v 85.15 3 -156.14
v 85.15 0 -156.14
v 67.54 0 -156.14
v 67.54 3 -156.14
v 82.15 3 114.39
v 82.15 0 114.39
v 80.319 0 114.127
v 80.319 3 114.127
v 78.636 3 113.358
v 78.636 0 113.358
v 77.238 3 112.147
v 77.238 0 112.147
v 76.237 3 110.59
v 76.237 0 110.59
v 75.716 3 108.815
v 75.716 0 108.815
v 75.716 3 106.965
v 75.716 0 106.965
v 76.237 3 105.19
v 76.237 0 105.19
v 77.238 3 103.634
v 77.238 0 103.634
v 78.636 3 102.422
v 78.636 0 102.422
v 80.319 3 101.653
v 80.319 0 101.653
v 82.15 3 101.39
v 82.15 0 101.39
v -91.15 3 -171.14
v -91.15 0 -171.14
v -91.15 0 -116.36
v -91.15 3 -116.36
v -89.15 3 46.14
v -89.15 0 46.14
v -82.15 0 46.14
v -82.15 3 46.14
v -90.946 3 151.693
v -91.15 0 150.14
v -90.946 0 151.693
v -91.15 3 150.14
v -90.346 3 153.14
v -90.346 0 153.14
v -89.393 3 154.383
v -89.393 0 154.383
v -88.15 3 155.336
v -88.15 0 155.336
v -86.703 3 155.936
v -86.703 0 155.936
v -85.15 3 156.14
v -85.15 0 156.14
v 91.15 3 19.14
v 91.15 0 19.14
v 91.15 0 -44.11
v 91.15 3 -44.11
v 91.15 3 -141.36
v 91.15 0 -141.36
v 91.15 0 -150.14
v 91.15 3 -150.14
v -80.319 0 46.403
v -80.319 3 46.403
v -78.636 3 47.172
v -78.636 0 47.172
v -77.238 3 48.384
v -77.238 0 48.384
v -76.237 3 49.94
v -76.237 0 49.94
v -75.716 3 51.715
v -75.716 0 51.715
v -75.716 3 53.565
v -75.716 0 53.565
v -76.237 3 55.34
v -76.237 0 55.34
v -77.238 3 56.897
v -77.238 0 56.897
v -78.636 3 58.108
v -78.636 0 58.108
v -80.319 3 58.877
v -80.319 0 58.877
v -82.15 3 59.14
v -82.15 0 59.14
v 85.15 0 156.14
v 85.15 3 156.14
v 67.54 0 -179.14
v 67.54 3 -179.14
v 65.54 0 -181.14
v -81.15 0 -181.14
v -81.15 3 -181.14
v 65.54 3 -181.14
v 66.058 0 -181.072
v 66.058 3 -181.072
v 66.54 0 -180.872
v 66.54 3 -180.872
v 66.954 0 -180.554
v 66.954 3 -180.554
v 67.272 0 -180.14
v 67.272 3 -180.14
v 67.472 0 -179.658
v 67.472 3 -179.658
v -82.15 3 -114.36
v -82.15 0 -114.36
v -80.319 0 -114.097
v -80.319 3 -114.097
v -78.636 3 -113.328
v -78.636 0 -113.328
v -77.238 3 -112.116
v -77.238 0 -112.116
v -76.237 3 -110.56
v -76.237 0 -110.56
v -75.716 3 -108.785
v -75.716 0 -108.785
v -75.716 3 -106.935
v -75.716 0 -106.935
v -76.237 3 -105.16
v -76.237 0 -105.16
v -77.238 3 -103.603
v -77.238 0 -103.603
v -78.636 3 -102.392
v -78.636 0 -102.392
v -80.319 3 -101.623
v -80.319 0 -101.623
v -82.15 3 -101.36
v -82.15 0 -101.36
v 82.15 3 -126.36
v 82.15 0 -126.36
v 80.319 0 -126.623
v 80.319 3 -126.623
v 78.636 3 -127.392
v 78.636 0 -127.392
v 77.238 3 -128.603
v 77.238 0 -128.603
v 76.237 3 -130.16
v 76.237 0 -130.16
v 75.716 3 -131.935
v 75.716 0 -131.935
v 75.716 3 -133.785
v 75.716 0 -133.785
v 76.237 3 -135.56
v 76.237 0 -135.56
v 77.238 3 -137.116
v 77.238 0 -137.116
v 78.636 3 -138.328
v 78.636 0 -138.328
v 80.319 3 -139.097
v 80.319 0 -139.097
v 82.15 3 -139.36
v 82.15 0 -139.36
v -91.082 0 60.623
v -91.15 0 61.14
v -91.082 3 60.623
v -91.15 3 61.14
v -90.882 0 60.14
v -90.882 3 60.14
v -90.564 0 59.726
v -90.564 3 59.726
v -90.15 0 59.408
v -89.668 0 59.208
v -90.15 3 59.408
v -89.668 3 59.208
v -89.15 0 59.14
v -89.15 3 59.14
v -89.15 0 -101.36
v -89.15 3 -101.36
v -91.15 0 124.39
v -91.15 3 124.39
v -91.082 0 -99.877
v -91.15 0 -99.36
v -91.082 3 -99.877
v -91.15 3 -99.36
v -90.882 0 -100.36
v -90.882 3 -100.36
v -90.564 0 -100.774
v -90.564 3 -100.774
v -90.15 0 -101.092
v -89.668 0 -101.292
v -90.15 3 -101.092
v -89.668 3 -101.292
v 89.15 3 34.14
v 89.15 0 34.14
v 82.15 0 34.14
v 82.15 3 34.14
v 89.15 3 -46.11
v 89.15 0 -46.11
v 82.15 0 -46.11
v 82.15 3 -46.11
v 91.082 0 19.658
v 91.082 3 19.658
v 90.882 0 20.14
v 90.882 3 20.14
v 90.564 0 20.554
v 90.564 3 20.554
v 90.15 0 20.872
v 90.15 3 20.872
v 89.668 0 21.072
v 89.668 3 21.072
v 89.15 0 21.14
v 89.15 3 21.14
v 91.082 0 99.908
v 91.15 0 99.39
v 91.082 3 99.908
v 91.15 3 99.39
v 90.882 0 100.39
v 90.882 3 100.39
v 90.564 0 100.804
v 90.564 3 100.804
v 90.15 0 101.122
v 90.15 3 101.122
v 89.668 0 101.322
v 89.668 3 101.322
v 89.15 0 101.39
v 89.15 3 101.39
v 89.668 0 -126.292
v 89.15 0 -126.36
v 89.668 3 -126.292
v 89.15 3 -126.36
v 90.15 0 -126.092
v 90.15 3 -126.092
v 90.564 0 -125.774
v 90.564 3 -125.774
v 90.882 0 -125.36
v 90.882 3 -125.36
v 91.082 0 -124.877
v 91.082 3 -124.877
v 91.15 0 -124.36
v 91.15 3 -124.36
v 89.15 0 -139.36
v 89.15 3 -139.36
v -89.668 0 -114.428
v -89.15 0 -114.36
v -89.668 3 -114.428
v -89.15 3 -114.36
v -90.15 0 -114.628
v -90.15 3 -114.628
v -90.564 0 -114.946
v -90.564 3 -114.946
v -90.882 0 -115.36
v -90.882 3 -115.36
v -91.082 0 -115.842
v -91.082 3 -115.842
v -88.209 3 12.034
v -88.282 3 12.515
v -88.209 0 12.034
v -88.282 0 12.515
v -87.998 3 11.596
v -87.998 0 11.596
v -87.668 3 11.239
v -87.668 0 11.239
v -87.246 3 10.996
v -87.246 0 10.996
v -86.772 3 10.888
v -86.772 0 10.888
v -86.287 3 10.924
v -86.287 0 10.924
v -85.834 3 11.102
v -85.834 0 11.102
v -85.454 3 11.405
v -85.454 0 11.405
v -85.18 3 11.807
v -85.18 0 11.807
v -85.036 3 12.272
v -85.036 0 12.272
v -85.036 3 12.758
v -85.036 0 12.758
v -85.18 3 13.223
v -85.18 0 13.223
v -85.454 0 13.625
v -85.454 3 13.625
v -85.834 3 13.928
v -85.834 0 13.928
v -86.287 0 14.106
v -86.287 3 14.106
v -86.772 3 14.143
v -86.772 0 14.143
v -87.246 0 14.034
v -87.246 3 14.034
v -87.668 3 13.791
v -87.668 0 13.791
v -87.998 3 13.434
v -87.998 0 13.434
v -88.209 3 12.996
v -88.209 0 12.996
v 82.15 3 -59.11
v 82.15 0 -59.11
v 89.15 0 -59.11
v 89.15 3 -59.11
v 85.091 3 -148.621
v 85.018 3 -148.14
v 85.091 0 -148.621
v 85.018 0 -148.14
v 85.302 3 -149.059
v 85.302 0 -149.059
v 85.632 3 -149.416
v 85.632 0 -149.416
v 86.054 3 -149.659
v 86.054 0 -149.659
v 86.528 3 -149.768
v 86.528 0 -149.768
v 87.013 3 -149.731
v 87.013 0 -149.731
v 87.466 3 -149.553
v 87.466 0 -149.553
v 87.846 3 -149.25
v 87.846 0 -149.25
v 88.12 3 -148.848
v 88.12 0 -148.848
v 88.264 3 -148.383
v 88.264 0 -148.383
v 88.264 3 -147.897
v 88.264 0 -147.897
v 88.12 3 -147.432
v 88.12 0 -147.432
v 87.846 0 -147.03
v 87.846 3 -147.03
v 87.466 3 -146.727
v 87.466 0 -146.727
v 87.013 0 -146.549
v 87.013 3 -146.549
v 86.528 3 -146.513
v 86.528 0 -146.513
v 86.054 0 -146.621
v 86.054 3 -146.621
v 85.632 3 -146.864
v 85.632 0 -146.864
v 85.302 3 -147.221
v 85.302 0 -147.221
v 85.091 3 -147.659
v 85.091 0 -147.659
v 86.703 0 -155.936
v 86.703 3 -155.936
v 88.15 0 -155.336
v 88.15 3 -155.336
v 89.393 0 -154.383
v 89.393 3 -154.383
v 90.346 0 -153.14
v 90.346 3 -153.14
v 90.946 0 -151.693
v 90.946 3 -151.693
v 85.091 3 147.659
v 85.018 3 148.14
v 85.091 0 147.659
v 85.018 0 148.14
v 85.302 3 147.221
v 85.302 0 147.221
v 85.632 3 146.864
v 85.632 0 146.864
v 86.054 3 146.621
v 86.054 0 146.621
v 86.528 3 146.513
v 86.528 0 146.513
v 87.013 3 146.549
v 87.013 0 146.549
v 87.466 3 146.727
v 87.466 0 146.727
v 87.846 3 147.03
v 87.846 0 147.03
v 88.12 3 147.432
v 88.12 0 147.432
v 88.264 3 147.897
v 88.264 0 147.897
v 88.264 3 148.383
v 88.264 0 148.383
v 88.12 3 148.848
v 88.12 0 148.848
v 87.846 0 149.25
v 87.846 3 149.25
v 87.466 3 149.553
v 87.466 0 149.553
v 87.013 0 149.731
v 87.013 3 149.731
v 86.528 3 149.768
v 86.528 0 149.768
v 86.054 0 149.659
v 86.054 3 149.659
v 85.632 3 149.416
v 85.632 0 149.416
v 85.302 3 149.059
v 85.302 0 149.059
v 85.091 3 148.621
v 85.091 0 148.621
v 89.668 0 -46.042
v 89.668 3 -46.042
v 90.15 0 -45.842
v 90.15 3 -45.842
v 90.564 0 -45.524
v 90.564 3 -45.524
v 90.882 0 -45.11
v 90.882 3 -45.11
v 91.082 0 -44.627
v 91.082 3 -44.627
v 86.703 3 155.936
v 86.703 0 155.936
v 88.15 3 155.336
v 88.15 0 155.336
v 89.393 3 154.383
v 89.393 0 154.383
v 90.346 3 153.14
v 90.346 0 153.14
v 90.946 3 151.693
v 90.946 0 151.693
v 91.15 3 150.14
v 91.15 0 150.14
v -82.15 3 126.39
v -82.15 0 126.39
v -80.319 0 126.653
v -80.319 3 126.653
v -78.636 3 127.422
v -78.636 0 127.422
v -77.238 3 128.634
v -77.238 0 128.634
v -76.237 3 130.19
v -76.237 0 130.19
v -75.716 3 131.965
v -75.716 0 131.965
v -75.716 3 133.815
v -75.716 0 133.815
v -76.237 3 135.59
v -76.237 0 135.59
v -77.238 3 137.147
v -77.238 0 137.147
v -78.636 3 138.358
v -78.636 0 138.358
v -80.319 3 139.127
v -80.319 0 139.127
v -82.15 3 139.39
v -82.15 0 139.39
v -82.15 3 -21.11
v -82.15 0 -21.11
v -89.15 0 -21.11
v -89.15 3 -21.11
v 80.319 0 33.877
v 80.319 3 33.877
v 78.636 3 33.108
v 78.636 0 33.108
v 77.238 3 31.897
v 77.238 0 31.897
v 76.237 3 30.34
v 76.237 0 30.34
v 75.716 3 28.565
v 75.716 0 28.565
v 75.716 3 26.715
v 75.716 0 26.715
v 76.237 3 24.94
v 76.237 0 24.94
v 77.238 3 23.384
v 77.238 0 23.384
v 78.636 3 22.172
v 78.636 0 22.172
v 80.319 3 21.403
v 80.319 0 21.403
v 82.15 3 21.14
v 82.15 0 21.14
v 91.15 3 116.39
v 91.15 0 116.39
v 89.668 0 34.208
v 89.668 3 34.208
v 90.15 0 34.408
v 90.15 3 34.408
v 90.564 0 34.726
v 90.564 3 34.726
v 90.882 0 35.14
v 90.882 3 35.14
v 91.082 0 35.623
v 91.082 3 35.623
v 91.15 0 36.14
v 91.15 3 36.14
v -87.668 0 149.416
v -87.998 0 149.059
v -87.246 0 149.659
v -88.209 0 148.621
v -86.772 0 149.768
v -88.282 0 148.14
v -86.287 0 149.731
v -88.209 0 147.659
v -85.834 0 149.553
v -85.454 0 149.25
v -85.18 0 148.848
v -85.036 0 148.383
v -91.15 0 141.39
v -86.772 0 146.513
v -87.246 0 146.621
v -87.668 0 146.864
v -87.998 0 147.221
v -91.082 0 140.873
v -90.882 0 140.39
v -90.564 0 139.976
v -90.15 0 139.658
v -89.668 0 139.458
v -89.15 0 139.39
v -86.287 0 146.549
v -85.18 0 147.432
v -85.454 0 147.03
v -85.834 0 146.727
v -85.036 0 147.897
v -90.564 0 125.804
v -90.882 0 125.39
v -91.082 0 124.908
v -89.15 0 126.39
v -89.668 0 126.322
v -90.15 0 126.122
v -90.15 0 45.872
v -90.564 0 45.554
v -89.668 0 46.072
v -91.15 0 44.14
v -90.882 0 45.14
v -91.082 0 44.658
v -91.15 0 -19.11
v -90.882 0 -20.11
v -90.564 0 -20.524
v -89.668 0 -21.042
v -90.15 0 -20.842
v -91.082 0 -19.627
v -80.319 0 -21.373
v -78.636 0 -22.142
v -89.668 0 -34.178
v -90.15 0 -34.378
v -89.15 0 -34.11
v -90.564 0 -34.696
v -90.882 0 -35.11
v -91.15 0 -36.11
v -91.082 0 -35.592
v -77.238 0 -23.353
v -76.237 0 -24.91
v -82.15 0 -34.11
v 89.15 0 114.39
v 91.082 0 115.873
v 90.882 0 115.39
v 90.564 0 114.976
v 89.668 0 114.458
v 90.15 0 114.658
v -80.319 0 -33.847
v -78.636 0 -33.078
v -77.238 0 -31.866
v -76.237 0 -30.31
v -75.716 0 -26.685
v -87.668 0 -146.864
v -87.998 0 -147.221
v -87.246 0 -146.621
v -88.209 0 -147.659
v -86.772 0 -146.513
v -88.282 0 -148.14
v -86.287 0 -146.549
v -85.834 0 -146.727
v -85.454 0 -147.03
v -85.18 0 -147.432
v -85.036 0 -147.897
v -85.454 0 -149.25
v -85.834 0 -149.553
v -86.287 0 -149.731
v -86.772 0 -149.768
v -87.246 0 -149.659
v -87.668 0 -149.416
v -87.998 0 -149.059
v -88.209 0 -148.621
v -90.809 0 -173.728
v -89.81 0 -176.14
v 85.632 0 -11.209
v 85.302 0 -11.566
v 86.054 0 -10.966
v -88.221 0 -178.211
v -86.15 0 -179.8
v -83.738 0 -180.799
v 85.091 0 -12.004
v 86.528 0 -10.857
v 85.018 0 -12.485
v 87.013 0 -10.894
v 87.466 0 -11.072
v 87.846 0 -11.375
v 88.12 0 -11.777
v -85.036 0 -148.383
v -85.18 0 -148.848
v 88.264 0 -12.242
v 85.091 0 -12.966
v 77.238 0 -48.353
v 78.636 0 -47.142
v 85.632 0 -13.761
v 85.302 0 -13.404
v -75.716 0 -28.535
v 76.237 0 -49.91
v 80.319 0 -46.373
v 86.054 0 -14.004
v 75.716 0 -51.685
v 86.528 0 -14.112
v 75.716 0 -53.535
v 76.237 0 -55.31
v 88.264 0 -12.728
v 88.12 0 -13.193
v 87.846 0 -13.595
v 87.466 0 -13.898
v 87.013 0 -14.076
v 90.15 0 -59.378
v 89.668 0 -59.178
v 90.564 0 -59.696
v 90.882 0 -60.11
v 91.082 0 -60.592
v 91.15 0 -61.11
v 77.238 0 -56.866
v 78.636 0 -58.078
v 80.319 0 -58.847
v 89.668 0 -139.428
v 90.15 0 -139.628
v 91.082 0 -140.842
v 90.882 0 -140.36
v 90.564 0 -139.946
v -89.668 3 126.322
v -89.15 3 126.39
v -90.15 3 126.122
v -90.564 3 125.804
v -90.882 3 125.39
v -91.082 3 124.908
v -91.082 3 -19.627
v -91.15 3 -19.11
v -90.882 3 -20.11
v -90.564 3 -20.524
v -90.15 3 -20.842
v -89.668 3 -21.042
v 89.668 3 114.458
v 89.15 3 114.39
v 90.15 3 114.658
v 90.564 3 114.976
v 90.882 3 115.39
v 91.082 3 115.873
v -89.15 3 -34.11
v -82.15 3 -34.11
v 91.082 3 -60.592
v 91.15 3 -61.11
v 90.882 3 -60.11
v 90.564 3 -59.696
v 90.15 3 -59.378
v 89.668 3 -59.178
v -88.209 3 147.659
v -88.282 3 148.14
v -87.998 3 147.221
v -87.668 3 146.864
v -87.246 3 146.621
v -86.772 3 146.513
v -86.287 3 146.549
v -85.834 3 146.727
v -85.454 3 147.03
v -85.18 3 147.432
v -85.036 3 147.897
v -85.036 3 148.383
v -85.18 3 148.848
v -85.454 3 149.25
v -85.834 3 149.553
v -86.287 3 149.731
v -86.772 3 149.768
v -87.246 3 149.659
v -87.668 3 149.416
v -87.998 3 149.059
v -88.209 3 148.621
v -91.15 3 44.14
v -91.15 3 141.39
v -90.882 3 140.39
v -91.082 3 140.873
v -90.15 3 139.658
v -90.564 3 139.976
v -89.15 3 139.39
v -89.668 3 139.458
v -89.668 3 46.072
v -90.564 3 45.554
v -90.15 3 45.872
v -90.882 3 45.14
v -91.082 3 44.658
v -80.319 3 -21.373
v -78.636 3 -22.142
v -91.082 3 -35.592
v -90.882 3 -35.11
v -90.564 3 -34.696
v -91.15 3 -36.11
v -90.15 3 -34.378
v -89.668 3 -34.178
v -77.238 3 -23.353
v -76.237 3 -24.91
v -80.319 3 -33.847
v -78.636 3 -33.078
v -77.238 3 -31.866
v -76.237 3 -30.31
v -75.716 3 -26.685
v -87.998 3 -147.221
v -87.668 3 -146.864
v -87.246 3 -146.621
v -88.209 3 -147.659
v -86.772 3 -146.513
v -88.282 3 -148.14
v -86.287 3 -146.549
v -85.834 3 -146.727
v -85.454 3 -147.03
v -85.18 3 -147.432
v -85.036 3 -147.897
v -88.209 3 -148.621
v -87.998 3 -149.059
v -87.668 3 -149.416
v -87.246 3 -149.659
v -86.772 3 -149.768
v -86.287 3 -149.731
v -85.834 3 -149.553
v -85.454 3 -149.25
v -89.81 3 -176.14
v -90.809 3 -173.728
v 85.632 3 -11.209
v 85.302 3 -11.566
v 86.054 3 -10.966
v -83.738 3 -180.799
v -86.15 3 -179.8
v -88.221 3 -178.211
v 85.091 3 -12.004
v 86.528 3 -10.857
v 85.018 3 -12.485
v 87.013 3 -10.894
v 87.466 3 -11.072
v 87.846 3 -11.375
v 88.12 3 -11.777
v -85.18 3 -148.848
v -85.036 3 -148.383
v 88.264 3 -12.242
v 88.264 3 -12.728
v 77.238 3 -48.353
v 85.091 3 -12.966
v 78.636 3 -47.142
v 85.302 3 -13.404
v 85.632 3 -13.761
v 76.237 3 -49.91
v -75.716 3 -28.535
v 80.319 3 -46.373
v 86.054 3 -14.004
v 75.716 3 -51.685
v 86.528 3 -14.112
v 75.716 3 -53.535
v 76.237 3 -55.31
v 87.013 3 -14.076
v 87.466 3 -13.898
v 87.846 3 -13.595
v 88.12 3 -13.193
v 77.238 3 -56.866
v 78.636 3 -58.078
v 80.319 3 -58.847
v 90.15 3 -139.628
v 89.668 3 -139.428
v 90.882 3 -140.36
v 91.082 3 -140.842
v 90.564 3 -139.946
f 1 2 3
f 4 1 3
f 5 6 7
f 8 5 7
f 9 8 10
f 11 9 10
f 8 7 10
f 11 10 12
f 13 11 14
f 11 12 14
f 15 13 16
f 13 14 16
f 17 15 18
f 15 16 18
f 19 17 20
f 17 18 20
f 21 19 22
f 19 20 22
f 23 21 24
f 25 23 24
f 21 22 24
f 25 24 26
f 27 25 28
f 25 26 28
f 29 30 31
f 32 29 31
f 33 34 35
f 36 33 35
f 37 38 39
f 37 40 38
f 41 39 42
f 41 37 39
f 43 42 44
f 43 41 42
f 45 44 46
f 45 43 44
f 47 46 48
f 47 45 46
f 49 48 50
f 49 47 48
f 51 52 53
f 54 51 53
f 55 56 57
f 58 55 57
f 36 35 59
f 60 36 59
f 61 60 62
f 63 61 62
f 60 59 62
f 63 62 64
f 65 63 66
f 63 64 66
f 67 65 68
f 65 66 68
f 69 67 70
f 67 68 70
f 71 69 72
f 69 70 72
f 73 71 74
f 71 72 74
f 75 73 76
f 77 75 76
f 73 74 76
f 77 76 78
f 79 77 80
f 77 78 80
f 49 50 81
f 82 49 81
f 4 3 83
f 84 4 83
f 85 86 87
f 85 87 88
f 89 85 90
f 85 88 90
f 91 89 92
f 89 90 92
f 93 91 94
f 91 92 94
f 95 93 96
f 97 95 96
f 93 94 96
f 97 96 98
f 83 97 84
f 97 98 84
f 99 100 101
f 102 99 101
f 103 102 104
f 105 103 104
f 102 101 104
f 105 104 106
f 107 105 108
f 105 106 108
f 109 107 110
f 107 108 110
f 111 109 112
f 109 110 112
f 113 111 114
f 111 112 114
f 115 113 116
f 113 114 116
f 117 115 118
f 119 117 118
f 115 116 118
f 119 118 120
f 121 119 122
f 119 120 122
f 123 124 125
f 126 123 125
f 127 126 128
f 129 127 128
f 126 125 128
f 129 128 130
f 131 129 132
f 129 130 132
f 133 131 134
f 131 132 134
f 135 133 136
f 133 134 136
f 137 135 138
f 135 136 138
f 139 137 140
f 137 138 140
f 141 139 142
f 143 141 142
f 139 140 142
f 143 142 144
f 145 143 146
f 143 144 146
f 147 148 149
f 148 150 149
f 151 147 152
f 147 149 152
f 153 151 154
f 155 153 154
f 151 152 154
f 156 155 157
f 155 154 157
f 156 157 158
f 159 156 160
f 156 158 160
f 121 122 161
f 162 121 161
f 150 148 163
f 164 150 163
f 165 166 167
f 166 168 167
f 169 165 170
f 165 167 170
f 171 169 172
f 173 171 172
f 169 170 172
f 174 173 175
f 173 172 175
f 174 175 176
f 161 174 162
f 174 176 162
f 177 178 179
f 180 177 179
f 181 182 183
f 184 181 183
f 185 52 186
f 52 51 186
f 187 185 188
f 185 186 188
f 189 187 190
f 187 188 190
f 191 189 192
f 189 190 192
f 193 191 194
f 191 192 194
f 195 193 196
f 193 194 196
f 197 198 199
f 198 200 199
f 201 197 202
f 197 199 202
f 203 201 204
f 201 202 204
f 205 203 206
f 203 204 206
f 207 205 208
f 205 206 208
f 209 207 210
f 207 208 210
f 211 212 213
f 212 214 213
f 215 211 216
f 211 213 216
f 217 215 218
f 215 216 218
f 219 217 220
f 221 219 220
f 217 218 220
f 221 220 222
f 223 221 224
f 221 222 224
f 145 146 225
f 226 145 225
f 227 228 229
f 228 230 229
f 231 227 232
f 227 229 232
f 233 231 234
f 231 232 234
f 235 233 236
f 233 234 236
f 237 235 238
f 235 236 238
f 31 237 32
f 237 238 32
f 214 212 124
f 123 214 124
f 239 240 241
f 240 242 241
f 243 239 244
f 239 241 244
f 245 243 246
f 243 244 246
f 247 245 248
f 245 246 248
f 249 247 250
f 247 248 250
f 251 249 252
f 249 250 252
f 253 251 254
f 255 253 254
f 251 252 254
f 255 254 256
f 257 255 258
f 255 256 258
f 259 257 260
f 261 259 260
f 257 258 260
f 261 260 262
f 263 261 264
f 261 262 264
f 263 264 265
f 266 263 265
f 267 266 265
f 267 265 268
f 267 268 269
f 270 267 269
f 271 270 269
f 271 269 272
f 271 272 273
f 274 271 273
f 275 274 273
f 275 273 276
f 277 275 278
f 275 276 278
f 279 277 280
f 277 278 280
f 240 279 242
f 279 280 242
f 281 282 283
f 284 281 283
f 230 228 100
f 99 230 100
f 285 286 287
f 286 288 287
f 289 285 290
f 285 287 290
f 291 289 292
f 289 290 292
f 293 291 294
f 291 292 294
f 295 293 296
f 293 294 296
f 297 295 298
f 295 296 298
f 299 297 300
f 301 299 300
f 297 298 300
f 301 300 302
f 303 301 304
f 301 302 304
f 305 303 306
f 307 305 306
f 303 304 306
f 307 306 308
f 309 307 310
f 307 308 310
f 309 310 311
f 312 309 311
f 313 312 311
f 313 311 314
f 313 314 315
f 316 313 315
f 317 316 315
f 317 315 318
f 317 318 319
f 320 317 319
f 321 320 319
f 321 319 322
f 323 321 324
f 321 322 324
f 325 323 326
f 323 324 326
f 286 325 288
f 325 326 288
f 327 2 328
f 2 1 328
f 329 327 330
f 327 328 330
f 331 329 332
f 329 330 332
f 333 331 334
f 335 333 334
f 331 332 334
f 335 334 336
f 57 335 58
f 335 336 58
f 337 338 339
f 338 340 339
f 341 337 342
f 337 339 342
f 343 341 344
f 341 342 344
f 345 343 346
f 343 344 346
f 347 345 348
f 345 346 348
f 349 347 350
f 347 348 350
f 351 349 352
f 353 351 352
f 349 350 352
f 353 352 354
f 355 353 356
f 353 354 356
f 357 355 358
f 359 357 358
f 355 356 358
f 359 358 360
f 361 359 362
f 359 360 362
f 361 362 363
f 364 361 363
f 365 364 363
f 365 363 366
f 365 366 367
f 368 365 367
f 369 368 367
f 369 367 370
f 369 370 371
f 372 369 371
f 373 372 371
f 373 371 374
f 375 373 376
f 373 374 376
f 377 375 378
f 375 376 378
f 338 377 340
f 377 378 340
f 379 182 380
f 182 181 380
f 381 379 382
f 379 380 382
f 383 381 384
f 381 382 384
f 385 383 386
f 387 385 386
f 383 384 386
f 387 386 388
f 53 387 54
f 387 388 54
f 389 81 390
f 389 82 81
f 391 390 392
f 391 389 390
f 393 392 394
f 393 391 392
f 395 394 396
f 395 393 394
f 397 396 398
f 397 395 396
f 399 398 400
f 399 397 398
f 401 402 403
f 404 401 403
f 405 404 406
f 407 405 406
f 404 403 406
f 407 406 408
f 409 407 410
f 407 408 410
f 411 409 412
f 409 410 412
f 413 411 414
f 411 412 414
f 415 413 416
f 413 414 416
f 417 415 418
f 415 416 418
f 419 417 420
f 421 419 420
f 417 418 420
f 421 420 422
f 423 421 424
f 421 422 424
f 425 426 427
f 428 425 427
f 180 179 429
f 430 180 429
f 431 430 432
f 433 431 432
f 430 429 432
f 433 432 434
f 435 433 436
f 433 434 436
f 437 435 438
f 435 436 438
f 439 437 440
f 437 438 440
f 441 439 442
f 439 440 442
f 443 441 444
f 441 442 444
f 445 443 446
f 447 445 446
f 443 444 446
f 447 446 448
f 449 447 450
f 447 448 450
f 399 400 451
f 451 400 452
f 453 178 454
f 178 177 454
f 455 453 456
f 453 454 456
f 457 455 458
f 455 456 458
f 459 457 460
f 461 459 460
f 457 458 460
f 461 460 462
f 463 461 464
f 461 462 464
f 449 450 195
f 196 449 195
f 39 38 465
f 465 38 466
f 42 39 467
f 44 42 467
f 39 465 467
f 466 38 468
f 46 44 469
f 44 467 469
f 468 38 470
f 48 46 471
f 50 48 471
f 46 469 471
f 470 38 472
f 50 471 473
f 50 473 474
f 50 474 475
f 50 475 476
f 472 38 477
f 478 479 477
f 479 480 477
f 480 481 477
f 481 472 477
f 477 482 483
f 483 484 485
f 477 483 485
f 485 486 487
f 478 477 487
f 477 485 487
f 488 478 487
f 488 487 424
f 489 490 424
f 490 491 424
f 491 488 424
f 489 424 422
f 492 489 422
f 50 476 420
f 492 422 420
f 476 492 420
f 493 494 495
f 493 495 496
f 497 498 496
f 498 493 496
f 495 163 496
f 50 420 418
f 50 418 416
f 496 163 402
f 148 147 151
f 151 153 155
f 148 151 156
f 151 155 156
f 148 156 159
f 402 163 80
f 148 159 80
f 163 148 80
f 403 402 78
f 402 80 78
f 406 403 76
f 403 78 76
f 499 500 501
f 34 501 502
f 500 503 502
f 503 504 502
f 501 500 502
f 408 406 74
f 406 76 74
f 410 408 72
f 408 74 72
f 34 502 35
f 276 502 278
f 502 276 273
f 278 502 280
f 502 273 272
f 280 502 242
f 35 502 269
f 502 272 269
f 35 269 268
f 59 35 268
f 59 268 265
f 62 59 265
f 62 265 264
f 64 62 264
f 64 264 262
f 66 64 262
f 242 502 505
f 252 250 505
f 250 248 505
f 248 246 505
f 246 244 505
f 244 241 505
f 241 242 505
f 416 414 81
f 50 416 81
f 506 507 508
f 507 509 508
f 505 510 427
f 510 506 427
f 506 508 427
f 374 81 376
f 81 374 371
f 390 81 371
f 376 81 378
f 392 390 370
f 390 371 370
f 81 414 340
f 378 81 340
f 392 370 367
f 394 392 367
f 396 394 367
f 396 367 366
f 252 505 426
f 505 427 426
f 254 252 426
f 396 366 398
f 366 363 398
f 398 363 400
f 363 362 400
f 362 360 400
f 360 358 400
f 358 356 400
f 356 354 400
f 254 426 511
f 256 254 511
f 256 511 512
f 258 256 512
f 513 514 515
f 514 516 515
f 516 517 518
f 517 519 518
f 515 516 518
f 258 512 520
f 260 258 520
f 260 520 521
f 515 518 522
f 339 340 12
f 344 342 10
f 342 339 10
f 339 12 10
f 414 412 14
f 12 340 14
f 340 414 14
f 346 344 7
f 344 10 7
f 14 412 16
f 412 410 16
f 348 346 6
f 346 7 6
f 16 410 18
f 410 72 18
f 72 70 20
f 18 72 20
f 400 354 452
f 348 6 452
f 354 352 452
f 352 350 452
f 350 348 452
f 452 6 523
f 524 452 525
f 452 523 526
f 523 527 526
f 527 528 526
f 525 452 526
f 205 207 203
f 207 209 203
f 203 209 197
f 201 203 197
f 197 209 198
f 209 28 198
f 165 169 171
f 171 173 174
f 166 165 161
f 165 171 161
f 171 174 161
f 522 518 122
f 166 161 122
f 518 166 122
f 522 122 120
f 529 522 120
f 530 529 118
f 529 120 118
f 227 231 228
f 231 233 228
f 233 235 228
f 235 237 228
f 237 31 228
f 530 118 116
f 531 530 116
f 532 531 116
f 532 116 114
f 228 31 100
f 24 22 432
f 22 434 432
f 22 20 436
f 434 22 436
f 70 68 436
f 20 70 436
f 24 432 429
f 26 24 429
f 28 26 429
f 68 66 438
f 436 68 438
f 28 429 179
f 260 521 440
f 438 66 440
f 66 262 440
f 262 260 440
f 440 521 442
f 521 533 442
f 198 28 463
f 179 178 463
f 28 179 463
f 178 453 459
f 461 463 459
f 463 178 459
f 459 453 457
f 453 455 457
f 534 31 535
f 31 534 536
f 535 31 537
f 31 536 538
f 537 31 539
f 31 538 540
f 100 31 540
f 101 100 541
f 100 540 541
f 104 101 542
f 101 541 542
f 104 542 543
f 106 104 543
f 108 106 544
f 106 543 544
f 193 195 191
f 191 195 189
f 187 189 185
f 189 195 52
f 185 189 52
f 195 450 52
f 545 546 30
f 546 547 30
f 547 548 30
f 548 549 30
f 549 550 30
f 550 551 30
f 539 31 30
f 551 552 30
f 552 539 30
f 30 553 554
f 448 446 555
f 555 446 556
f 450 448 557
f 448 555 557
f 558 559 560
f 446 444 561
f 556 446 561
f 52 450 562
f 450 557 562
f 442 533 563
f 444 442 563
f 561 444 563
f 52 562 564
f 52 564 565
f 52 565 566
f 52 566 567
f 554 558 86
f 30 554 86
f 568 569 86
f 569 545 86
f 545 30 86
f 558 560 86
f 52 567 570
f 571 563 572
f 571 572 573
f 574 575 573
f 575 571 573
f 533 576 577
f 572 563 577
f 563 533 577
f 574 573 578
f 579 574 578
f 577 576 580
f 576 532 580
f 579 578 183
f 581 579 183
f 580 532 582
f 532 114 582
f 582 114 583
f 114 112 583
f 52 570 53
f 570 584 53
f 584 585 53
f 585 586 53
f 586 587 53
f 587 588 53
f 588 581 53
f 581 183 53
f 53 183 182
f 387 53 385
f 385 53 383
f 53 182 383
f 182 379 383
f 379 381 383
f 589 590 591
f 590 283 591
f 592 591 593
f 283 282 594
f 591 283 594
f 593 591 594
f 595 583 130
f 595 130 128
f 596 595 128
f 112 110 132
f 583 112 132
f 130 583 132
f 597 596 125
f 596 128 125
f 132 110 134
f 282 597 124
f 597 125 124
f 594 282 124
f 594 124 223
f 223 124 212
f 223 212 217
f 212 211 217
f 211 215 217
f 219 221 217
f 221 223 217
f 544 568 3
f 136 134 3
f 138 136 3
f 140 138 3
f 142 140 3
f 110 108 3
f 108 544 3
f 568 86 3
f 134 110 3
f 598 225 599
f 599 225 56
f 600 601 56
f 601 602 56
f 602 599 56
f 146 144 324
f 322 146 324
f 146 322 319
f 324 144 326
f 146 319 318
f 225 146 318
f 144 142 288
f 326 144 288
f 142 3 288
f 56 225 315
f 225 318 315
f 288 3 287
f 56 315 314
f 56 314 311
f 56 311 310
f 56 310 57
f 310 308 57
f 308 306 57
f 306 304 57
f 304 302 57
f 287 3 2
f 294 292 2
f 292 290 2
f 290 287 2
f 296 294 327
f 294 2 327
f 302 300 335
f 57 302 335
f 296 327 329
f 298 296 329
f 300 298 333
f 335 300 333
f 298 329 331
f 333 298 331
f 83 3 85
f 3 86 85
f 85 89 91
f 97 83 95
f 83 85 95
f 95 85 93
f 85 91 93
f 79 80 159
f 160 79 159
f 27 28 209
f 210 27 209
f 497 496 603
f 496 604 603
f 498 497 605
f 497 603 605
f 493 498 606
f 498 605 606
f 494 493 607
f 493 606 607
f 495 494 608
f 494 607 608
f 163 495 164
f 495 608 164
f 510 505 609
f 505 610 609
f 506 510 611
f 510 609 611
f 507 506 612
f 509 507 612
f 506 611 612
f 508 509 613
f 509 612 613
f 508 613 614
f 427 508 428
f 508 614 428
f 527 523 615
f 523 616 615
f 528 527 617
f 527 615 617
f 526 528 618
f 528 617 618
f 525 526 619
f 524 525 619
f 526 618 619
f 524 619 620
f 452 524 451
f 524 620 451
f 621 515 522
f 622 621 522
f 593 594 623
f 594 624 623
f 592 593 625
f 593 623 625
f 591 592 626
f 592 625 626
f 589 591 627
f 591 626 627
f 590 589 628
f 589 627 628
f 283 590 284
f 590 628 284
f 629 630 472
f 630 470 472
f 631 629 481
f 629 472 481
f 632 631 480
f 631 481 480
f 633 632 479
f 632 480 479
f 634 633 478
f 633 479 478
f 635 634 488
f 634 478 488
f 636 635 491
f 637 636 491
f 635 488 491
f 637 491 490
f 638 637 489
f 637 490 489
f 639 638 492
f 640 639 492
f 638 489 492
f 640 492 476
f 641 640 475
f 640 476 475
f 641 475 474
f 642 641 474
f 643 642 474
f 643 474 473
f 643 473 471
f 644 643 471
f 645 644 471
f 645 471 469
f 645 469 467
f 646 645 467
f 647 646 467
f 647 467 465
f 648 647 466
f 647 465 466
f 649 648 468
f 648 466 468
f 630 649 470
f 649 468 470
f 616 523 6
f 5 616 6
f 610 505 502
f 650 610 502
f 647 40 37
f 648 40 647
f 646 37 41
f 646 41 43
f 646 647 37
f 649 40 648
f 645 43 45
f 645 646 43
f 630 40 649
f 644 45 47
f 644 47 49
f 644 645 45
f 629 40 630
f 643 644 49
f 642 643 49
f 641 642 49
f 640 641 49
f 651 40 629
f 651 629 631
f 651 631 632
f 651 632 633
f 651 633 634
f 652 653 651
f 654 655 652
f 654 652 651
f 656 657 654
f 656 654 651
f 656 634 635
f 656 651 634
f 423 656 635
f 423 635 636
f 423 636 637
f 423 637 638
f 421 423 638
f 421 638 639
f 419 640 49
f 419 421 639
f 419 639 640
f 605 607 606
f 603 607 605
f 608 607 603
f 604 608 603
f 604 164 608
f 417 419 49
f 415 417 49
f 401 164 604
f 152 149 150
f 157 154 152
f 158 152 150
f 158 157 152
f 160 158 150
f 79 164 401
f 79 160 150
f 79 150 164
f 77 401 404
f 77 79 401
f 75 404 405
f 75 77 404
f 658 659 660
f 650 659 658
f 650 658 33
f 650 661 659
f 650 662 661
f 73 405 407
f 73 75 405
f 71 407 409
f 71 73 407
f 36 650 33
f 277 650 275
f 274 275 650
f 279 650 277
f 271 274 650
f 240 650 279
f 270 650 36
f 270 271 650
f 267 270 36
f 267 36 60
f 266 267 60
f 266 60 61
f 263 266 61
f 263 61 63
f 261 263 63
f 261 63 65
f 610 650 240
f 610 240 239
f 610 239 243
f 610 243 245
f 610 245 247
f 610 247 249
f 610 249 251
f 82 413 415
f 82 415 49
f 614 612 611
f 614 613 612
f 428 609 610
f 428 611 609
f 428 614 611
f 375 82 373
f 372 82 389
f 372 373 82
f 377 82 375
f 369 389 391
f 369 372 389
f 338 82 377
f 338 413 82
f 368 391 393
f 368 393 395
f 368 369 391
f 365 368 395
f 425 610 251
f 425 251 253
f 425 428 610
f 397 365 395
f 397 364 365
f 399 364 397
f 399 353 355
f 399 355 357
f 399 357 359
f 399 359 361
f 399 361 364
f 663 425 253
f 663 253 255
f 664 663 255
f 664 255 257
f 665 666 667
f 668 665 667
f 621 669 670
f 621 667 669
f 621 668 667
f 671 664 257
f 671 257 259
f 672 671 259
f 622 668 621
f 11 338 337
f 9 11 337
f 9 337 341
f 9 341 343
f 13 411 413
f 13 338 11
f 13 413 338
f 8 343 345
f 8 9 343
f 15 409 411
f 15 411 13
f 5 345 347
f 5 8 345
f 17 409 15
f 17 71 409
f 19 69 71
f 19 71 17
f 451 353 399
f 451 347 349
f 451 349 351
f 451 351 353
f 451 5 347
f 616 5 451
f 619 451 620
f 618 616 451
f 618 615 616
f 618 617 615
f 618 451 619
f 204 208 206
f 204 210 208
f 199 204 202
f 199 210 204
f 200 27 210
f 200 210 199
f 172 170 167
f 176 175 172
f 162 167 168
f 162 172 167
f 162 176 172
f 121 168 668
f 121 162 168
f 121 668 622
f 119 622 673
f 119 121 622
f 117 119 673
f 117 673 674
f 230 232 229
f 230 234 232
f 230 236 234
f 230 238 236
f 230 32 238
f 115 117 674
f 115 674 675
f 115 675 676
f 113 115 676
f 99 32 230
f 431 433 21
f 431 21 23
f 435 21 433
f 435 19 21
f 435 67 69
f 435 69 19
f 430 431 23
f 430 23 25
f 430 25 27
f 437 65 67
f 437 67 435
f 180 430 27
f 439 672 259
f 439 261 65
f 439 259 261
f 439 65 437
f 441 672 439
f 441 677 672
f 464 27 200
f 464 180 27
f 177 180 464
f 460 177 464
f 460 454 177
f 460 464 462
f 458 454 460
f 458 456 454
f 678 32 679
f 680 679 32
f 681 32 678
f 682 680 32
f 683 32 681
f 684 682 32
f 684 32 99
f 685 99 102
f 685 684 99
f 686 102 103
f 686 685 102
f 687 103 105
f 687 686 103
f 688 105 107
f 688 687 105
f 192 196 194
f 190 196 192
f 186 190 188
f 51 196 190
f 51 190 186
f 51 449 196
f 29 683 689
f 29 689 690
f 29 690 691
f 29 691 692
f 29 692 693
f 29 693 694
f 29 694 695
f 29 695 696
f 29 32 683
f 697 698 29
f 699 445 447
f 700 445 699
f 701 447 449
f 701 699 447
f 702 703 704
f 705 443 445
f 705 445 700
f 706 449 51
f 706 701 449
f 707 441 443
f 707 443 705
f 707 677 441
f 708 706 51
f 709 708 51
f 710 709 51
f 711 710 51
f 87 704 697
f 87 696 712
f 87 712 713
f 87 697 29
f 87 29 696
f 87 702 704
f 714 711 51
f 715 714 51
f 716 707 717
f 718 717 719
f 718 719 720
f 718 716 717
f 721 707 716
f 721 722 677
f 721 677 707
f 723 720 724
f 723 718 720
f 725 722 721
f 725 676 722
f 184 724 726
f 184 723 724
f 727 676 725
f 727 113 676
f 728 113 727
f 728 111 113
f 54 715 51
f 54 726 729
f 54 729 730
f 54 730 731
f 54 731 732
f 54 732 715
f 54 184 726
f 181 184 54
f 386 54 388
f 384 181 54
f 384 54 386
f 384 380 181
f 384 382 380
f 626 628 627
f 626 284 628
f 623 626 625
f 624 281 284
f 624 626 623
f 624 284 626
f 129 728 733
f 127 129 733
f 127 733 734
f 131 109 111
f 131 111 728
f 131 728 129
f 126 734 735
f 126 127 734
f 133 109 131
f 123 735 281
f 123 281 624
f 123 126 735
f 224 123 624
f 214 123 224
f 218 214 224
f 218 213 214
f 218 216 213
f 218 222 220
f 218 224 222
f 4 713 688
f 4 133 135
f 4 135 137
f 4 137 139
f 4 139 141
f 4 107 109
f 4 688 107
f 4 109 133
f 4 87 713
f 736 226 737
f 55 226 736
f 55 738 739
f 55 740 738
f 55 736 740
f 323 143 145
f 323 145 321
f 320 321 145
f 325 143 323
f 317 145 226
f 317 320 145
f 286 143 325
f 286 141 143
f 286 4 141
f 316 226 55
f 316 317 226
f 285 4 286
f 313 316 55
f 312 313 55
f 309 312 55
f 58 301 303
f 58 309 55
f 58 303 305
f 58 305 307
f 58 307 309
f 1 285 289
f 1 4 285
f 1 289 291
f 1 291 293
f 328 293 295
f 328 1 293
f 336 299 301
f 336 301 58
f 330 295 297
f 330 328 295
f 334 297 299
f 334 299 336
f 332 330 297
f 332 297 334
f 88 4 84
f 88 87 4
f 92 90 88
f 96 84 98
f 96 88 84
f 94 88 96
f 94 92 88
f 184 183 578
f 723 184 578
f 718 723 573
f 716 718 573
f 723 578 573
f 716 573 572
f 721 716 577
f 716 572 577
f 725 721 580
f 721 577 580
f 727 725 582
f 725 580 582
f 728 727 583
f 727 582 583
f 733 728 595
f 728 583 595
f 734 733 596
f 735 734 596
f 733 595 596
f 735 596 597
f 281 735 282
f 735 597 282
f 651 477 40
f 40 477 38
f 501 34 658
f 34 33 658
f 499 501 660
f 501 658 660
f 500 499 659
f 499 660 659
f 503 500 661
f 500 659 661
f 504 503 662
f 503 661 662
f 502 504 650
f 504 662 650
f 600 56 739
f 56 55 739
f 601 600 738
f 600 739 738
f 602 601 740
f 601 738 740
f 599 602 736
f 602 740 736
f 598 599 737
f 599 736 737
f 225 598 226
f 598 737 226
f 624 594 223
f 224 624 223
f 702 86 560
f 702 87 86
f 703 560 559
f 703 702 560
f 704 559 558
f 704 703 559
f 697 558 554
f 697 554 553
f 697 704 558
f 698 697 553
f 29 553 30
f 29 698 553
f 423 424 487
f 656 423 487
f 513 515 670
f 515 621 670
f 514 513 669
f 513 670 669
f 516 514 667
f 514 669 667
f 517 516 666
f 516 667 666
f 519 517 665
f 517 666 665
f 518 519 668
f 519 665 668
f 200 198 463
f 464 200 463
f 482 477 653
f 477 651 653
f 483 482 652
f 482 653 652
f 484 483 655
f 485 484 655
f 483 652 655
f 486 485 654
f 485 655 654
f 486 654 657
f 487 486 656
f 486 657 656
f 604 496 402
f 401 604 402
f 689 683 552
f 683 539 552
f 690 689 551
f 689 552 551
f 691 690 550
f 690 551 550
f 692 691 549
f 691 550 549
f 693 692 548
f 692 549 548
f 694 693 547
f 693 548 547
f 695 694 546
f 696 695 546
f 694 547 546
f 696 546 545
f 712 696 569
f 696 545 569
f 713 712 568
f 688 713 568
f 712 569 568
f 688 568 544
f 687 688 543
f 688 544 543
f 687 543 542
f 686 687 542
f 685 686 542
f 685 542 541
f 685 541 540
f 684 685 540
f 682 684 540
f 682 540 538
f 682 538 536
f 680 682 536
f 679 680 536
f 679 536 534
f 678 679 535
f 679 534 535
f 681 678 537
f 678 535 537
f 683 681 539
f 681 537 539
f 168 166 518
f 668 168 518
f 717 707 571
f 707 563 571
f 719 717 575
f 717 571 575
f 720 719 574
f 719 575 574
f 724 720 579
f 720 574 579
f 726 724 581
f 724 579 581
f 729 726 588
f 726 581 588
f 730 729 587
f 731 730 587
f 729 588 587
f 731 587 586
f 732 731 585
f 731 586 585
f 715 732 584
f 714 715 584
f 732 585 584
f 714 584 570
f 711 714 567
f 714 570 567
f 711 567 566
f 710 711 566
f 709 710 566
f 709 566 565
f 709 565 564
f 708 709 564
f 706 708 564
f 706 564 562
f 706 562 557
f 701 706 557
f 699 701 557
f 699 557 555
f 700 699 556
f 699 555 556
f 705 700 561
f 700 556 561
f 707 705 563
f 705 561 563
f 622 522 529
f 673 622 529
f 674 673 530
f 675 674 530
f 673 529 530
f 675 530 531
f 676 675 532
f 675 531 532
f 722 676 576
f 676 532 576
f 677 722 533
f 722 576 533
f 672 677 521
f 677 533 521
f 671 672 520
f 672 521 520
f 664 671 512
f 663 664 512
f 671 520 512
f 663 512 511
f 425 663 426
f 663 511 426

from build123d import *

# Parameters (mm, degrees)
SKETCH1_W                 = 158.69
SKETCH1_H                 = 25
BOSS_EXTRUDE1_DEPTH       = 3
FILLET1_R                 = 10
FILLET2_R                 = 6
F_4_CLEARANCE_HOLE1_D     = 3.2639
F_4_CLEARANCE_HOLE1_DEPTH = 3
F_4_CLEARANCE_HOLE1_TIP   = 0.980574487
FILLET3_R                 = 2


with BuildPart() as part:
    # Sketch1 → Boss-Extrude1 (new body)
    with BuildSketch(Plane(origin=(0, 0, 0), x_dir=(1, 0, 0), z_dir=(0, 1, 0))):
        with BuildLine():
            Line((-91.15, 34.109827366), (-82.15, 34.109827366))
            ThreePointArc((-82.15, 34.109827366), (-75.65, 27.609827366), (-82.15, 21.109827366))
            Line((-82.15, 21.109827366), (-91.15, 21.109827366))
            Line((-91.15, 21.109827366), (-91.15, -46.140172634))
            Line((-91.15, -46.140172634), (-82.15, -46.140172634))
            ThreePointArc((-82.15, -46.140172634), (-75.65, -52.640172634), (-82.15, -59.140172634))
            Line((-82.15, -59.140172634), (-91.15, -59.140172634))
            Line((-91.15, -59.140172634), (-91.15, -126.390172634))
            Line((-91.15, -126.390172634), (-82.15, -126.390172634))
            ThreePointArc((-82.15, -126.390172634), (-75.65, -132.890172634), (-82.15, -139.390172634))
            Line((-82.15, -139.390172634), (-91.15, -139.390172634))
            Line((-91.15, -139.390172634), (-91.15, -156.140172634))
            Line((-91.15, -156.140172634), (91.15, -156.140172634))
            Line((91.15, -156.140172634), (91.15, -114.390172634))
            Line((91.15, -114.390172634), (82.15, -114.390172634))
            ThreePointArc((82.15, -114.390172634), (75.65, -107.890172634), (82.15, -101.390172634))
            Line((82.15, -101.390172634), (91.15, -101.390172634))
            Line((91.15, -101.390172634), (91.15, -34.140172634))
            Line((91.15, -34.140172634), (82.15, -34.140172634))
            ThreePointArc((82.15, -34.140172634), (75.65, -27.640172634), (82.15, -21.140172634))
            Line((82.15, -21.140172634), (91.15, -21.140172634))
            Line((91.15, -21.140172634), (91.15, 46.109827366))
            Line((91.15, 46.109827366), (82.15, 46.109827366))
            ThreePointArc((82.15, 46.109827366), (75.65, 52.609827366), (82.15, 59.109827366))
            Line((82.15, 59.109827366), (91.15, 59.109827366))
            Line((91.15, 59.109827366), (91.15, 126.359827366))
            Line((91.15, 126.359827366), (82.15, 126.359827366))
            ThreePointArc((82.15, 126.359827366), (75.65, 132.859827366), (82.15, 139.359827366))
            Line((82.15, 139.359827366), (91.15, 139.359827366))
            Line((91.15, 139.359827366), (91.15, 156.140172634))
            Line((91.15, 156.140172634), (67.54, 156.140172634))
            Line((67.54, 156.140172634), (-91.15, 156.140172634))
            Line((-91.15, 156.140172634), (-91.15, 114.359827366))
            Line((-91.15, 114.359827366), (-82.15, 114.359827366))
            ThreePointArc((-82.15, 114.359827366), (-75.65, 107.859827366), (-82.15, 101.359827366))
            Line((-82.15, 101.359827366), (-91.15, 101.359827366))
            Line((-91.15, 101.359827366), (-91.15, 34.109827366))
        make_face()
        with Locations((-11.805, 168.640172634)):
            Rectangle(SKETCH1_W, SKETCH1_H)
    extrude(amount=BOSS_EXTRUDE1_DEPTH)

    # Fillet1
    fillet1_edges = [part.edges().sort_by_distance(p)[0] for p in [
        (-91.15, 1.5, -181.140172634),
    ]]
    fillet(fillet1_edges, radius=FILLET1_R)

    # Fillet2
    fillet2_edges = [part.edges().sort_by_distance(p)[0] for p in [
        (91.15, 1.5, 156.140172634),
        (-91.15, 1.5, 156.140172634),
        (91.15, 1.5, -156.140172634),
    ]]
    fillet(fillet2_edges, radius=FILLET2_R)

    # #4 Clearance Hole1
    with Locations(Plane(origin=(0, 3, 0), x_dir=(1, 0, 0), z_dir=(0, 1, 0))):
        with Locations((86.65, 148.140172634), (-86.65, -148.140172634), (-86.65, -12.515172634), (-86.65, 148.140172634), (86.65, 12.484827366), (86.65, -148.140172634)):
            Hole(F_4_CLEARANCE_HOLE1_D / 2, depth=F_4_CLEARANCE_HOLE1_DEPTH)
            with Locations((0, 0, -(F_4_CLEARANCE_HOLE1_DEPTH + F_4_CLEARANCE_HOLE1_TIP / 2))):  # 118° drill point
                Cone(0, F_4_CLEARANCE_HOLE1_D / 2, F_4_CLEARANCE_HOLE1_TIP, mode=Mode.SUBTRACT)

    # Fillet3
    fillet3_edges = [part.edges().sort_by_distance(p)[0] for p in [
        (67.54, 1.5, -181.140172634),
        (91.15, 1.5, -126.359827366),
        (91.15, 1.5, -59.109827366),
        (91.15, 1.5, -46.109827366),
        (91.15, 1.5, 21.140172634),
        (91.15, 1.5, 34.140172634),
        (91.15, 1.5, 101.390172634),
        (91.15, 1.5, 114.390172634),
        (-91.15, 1.5, 139.390172634),
        (-91.15, 1.5, 126.390172634),
        (-91.15, 1.5, 59.140172634),
        (-91.15, 1.5, 46.140172634),
        (-91.15, 1.5, -21.109827366),
        (-91.15, 1.5, -34.109827366),
        (-91.15, 1.5, -101.359827366),
        (-91.15, 1.5, -114.359827366),
        (91.15, 1.5, -139.359827366),
    ]]
    fillet(fillet3_edges, radius=FILLET3_R)


solid = part.part
